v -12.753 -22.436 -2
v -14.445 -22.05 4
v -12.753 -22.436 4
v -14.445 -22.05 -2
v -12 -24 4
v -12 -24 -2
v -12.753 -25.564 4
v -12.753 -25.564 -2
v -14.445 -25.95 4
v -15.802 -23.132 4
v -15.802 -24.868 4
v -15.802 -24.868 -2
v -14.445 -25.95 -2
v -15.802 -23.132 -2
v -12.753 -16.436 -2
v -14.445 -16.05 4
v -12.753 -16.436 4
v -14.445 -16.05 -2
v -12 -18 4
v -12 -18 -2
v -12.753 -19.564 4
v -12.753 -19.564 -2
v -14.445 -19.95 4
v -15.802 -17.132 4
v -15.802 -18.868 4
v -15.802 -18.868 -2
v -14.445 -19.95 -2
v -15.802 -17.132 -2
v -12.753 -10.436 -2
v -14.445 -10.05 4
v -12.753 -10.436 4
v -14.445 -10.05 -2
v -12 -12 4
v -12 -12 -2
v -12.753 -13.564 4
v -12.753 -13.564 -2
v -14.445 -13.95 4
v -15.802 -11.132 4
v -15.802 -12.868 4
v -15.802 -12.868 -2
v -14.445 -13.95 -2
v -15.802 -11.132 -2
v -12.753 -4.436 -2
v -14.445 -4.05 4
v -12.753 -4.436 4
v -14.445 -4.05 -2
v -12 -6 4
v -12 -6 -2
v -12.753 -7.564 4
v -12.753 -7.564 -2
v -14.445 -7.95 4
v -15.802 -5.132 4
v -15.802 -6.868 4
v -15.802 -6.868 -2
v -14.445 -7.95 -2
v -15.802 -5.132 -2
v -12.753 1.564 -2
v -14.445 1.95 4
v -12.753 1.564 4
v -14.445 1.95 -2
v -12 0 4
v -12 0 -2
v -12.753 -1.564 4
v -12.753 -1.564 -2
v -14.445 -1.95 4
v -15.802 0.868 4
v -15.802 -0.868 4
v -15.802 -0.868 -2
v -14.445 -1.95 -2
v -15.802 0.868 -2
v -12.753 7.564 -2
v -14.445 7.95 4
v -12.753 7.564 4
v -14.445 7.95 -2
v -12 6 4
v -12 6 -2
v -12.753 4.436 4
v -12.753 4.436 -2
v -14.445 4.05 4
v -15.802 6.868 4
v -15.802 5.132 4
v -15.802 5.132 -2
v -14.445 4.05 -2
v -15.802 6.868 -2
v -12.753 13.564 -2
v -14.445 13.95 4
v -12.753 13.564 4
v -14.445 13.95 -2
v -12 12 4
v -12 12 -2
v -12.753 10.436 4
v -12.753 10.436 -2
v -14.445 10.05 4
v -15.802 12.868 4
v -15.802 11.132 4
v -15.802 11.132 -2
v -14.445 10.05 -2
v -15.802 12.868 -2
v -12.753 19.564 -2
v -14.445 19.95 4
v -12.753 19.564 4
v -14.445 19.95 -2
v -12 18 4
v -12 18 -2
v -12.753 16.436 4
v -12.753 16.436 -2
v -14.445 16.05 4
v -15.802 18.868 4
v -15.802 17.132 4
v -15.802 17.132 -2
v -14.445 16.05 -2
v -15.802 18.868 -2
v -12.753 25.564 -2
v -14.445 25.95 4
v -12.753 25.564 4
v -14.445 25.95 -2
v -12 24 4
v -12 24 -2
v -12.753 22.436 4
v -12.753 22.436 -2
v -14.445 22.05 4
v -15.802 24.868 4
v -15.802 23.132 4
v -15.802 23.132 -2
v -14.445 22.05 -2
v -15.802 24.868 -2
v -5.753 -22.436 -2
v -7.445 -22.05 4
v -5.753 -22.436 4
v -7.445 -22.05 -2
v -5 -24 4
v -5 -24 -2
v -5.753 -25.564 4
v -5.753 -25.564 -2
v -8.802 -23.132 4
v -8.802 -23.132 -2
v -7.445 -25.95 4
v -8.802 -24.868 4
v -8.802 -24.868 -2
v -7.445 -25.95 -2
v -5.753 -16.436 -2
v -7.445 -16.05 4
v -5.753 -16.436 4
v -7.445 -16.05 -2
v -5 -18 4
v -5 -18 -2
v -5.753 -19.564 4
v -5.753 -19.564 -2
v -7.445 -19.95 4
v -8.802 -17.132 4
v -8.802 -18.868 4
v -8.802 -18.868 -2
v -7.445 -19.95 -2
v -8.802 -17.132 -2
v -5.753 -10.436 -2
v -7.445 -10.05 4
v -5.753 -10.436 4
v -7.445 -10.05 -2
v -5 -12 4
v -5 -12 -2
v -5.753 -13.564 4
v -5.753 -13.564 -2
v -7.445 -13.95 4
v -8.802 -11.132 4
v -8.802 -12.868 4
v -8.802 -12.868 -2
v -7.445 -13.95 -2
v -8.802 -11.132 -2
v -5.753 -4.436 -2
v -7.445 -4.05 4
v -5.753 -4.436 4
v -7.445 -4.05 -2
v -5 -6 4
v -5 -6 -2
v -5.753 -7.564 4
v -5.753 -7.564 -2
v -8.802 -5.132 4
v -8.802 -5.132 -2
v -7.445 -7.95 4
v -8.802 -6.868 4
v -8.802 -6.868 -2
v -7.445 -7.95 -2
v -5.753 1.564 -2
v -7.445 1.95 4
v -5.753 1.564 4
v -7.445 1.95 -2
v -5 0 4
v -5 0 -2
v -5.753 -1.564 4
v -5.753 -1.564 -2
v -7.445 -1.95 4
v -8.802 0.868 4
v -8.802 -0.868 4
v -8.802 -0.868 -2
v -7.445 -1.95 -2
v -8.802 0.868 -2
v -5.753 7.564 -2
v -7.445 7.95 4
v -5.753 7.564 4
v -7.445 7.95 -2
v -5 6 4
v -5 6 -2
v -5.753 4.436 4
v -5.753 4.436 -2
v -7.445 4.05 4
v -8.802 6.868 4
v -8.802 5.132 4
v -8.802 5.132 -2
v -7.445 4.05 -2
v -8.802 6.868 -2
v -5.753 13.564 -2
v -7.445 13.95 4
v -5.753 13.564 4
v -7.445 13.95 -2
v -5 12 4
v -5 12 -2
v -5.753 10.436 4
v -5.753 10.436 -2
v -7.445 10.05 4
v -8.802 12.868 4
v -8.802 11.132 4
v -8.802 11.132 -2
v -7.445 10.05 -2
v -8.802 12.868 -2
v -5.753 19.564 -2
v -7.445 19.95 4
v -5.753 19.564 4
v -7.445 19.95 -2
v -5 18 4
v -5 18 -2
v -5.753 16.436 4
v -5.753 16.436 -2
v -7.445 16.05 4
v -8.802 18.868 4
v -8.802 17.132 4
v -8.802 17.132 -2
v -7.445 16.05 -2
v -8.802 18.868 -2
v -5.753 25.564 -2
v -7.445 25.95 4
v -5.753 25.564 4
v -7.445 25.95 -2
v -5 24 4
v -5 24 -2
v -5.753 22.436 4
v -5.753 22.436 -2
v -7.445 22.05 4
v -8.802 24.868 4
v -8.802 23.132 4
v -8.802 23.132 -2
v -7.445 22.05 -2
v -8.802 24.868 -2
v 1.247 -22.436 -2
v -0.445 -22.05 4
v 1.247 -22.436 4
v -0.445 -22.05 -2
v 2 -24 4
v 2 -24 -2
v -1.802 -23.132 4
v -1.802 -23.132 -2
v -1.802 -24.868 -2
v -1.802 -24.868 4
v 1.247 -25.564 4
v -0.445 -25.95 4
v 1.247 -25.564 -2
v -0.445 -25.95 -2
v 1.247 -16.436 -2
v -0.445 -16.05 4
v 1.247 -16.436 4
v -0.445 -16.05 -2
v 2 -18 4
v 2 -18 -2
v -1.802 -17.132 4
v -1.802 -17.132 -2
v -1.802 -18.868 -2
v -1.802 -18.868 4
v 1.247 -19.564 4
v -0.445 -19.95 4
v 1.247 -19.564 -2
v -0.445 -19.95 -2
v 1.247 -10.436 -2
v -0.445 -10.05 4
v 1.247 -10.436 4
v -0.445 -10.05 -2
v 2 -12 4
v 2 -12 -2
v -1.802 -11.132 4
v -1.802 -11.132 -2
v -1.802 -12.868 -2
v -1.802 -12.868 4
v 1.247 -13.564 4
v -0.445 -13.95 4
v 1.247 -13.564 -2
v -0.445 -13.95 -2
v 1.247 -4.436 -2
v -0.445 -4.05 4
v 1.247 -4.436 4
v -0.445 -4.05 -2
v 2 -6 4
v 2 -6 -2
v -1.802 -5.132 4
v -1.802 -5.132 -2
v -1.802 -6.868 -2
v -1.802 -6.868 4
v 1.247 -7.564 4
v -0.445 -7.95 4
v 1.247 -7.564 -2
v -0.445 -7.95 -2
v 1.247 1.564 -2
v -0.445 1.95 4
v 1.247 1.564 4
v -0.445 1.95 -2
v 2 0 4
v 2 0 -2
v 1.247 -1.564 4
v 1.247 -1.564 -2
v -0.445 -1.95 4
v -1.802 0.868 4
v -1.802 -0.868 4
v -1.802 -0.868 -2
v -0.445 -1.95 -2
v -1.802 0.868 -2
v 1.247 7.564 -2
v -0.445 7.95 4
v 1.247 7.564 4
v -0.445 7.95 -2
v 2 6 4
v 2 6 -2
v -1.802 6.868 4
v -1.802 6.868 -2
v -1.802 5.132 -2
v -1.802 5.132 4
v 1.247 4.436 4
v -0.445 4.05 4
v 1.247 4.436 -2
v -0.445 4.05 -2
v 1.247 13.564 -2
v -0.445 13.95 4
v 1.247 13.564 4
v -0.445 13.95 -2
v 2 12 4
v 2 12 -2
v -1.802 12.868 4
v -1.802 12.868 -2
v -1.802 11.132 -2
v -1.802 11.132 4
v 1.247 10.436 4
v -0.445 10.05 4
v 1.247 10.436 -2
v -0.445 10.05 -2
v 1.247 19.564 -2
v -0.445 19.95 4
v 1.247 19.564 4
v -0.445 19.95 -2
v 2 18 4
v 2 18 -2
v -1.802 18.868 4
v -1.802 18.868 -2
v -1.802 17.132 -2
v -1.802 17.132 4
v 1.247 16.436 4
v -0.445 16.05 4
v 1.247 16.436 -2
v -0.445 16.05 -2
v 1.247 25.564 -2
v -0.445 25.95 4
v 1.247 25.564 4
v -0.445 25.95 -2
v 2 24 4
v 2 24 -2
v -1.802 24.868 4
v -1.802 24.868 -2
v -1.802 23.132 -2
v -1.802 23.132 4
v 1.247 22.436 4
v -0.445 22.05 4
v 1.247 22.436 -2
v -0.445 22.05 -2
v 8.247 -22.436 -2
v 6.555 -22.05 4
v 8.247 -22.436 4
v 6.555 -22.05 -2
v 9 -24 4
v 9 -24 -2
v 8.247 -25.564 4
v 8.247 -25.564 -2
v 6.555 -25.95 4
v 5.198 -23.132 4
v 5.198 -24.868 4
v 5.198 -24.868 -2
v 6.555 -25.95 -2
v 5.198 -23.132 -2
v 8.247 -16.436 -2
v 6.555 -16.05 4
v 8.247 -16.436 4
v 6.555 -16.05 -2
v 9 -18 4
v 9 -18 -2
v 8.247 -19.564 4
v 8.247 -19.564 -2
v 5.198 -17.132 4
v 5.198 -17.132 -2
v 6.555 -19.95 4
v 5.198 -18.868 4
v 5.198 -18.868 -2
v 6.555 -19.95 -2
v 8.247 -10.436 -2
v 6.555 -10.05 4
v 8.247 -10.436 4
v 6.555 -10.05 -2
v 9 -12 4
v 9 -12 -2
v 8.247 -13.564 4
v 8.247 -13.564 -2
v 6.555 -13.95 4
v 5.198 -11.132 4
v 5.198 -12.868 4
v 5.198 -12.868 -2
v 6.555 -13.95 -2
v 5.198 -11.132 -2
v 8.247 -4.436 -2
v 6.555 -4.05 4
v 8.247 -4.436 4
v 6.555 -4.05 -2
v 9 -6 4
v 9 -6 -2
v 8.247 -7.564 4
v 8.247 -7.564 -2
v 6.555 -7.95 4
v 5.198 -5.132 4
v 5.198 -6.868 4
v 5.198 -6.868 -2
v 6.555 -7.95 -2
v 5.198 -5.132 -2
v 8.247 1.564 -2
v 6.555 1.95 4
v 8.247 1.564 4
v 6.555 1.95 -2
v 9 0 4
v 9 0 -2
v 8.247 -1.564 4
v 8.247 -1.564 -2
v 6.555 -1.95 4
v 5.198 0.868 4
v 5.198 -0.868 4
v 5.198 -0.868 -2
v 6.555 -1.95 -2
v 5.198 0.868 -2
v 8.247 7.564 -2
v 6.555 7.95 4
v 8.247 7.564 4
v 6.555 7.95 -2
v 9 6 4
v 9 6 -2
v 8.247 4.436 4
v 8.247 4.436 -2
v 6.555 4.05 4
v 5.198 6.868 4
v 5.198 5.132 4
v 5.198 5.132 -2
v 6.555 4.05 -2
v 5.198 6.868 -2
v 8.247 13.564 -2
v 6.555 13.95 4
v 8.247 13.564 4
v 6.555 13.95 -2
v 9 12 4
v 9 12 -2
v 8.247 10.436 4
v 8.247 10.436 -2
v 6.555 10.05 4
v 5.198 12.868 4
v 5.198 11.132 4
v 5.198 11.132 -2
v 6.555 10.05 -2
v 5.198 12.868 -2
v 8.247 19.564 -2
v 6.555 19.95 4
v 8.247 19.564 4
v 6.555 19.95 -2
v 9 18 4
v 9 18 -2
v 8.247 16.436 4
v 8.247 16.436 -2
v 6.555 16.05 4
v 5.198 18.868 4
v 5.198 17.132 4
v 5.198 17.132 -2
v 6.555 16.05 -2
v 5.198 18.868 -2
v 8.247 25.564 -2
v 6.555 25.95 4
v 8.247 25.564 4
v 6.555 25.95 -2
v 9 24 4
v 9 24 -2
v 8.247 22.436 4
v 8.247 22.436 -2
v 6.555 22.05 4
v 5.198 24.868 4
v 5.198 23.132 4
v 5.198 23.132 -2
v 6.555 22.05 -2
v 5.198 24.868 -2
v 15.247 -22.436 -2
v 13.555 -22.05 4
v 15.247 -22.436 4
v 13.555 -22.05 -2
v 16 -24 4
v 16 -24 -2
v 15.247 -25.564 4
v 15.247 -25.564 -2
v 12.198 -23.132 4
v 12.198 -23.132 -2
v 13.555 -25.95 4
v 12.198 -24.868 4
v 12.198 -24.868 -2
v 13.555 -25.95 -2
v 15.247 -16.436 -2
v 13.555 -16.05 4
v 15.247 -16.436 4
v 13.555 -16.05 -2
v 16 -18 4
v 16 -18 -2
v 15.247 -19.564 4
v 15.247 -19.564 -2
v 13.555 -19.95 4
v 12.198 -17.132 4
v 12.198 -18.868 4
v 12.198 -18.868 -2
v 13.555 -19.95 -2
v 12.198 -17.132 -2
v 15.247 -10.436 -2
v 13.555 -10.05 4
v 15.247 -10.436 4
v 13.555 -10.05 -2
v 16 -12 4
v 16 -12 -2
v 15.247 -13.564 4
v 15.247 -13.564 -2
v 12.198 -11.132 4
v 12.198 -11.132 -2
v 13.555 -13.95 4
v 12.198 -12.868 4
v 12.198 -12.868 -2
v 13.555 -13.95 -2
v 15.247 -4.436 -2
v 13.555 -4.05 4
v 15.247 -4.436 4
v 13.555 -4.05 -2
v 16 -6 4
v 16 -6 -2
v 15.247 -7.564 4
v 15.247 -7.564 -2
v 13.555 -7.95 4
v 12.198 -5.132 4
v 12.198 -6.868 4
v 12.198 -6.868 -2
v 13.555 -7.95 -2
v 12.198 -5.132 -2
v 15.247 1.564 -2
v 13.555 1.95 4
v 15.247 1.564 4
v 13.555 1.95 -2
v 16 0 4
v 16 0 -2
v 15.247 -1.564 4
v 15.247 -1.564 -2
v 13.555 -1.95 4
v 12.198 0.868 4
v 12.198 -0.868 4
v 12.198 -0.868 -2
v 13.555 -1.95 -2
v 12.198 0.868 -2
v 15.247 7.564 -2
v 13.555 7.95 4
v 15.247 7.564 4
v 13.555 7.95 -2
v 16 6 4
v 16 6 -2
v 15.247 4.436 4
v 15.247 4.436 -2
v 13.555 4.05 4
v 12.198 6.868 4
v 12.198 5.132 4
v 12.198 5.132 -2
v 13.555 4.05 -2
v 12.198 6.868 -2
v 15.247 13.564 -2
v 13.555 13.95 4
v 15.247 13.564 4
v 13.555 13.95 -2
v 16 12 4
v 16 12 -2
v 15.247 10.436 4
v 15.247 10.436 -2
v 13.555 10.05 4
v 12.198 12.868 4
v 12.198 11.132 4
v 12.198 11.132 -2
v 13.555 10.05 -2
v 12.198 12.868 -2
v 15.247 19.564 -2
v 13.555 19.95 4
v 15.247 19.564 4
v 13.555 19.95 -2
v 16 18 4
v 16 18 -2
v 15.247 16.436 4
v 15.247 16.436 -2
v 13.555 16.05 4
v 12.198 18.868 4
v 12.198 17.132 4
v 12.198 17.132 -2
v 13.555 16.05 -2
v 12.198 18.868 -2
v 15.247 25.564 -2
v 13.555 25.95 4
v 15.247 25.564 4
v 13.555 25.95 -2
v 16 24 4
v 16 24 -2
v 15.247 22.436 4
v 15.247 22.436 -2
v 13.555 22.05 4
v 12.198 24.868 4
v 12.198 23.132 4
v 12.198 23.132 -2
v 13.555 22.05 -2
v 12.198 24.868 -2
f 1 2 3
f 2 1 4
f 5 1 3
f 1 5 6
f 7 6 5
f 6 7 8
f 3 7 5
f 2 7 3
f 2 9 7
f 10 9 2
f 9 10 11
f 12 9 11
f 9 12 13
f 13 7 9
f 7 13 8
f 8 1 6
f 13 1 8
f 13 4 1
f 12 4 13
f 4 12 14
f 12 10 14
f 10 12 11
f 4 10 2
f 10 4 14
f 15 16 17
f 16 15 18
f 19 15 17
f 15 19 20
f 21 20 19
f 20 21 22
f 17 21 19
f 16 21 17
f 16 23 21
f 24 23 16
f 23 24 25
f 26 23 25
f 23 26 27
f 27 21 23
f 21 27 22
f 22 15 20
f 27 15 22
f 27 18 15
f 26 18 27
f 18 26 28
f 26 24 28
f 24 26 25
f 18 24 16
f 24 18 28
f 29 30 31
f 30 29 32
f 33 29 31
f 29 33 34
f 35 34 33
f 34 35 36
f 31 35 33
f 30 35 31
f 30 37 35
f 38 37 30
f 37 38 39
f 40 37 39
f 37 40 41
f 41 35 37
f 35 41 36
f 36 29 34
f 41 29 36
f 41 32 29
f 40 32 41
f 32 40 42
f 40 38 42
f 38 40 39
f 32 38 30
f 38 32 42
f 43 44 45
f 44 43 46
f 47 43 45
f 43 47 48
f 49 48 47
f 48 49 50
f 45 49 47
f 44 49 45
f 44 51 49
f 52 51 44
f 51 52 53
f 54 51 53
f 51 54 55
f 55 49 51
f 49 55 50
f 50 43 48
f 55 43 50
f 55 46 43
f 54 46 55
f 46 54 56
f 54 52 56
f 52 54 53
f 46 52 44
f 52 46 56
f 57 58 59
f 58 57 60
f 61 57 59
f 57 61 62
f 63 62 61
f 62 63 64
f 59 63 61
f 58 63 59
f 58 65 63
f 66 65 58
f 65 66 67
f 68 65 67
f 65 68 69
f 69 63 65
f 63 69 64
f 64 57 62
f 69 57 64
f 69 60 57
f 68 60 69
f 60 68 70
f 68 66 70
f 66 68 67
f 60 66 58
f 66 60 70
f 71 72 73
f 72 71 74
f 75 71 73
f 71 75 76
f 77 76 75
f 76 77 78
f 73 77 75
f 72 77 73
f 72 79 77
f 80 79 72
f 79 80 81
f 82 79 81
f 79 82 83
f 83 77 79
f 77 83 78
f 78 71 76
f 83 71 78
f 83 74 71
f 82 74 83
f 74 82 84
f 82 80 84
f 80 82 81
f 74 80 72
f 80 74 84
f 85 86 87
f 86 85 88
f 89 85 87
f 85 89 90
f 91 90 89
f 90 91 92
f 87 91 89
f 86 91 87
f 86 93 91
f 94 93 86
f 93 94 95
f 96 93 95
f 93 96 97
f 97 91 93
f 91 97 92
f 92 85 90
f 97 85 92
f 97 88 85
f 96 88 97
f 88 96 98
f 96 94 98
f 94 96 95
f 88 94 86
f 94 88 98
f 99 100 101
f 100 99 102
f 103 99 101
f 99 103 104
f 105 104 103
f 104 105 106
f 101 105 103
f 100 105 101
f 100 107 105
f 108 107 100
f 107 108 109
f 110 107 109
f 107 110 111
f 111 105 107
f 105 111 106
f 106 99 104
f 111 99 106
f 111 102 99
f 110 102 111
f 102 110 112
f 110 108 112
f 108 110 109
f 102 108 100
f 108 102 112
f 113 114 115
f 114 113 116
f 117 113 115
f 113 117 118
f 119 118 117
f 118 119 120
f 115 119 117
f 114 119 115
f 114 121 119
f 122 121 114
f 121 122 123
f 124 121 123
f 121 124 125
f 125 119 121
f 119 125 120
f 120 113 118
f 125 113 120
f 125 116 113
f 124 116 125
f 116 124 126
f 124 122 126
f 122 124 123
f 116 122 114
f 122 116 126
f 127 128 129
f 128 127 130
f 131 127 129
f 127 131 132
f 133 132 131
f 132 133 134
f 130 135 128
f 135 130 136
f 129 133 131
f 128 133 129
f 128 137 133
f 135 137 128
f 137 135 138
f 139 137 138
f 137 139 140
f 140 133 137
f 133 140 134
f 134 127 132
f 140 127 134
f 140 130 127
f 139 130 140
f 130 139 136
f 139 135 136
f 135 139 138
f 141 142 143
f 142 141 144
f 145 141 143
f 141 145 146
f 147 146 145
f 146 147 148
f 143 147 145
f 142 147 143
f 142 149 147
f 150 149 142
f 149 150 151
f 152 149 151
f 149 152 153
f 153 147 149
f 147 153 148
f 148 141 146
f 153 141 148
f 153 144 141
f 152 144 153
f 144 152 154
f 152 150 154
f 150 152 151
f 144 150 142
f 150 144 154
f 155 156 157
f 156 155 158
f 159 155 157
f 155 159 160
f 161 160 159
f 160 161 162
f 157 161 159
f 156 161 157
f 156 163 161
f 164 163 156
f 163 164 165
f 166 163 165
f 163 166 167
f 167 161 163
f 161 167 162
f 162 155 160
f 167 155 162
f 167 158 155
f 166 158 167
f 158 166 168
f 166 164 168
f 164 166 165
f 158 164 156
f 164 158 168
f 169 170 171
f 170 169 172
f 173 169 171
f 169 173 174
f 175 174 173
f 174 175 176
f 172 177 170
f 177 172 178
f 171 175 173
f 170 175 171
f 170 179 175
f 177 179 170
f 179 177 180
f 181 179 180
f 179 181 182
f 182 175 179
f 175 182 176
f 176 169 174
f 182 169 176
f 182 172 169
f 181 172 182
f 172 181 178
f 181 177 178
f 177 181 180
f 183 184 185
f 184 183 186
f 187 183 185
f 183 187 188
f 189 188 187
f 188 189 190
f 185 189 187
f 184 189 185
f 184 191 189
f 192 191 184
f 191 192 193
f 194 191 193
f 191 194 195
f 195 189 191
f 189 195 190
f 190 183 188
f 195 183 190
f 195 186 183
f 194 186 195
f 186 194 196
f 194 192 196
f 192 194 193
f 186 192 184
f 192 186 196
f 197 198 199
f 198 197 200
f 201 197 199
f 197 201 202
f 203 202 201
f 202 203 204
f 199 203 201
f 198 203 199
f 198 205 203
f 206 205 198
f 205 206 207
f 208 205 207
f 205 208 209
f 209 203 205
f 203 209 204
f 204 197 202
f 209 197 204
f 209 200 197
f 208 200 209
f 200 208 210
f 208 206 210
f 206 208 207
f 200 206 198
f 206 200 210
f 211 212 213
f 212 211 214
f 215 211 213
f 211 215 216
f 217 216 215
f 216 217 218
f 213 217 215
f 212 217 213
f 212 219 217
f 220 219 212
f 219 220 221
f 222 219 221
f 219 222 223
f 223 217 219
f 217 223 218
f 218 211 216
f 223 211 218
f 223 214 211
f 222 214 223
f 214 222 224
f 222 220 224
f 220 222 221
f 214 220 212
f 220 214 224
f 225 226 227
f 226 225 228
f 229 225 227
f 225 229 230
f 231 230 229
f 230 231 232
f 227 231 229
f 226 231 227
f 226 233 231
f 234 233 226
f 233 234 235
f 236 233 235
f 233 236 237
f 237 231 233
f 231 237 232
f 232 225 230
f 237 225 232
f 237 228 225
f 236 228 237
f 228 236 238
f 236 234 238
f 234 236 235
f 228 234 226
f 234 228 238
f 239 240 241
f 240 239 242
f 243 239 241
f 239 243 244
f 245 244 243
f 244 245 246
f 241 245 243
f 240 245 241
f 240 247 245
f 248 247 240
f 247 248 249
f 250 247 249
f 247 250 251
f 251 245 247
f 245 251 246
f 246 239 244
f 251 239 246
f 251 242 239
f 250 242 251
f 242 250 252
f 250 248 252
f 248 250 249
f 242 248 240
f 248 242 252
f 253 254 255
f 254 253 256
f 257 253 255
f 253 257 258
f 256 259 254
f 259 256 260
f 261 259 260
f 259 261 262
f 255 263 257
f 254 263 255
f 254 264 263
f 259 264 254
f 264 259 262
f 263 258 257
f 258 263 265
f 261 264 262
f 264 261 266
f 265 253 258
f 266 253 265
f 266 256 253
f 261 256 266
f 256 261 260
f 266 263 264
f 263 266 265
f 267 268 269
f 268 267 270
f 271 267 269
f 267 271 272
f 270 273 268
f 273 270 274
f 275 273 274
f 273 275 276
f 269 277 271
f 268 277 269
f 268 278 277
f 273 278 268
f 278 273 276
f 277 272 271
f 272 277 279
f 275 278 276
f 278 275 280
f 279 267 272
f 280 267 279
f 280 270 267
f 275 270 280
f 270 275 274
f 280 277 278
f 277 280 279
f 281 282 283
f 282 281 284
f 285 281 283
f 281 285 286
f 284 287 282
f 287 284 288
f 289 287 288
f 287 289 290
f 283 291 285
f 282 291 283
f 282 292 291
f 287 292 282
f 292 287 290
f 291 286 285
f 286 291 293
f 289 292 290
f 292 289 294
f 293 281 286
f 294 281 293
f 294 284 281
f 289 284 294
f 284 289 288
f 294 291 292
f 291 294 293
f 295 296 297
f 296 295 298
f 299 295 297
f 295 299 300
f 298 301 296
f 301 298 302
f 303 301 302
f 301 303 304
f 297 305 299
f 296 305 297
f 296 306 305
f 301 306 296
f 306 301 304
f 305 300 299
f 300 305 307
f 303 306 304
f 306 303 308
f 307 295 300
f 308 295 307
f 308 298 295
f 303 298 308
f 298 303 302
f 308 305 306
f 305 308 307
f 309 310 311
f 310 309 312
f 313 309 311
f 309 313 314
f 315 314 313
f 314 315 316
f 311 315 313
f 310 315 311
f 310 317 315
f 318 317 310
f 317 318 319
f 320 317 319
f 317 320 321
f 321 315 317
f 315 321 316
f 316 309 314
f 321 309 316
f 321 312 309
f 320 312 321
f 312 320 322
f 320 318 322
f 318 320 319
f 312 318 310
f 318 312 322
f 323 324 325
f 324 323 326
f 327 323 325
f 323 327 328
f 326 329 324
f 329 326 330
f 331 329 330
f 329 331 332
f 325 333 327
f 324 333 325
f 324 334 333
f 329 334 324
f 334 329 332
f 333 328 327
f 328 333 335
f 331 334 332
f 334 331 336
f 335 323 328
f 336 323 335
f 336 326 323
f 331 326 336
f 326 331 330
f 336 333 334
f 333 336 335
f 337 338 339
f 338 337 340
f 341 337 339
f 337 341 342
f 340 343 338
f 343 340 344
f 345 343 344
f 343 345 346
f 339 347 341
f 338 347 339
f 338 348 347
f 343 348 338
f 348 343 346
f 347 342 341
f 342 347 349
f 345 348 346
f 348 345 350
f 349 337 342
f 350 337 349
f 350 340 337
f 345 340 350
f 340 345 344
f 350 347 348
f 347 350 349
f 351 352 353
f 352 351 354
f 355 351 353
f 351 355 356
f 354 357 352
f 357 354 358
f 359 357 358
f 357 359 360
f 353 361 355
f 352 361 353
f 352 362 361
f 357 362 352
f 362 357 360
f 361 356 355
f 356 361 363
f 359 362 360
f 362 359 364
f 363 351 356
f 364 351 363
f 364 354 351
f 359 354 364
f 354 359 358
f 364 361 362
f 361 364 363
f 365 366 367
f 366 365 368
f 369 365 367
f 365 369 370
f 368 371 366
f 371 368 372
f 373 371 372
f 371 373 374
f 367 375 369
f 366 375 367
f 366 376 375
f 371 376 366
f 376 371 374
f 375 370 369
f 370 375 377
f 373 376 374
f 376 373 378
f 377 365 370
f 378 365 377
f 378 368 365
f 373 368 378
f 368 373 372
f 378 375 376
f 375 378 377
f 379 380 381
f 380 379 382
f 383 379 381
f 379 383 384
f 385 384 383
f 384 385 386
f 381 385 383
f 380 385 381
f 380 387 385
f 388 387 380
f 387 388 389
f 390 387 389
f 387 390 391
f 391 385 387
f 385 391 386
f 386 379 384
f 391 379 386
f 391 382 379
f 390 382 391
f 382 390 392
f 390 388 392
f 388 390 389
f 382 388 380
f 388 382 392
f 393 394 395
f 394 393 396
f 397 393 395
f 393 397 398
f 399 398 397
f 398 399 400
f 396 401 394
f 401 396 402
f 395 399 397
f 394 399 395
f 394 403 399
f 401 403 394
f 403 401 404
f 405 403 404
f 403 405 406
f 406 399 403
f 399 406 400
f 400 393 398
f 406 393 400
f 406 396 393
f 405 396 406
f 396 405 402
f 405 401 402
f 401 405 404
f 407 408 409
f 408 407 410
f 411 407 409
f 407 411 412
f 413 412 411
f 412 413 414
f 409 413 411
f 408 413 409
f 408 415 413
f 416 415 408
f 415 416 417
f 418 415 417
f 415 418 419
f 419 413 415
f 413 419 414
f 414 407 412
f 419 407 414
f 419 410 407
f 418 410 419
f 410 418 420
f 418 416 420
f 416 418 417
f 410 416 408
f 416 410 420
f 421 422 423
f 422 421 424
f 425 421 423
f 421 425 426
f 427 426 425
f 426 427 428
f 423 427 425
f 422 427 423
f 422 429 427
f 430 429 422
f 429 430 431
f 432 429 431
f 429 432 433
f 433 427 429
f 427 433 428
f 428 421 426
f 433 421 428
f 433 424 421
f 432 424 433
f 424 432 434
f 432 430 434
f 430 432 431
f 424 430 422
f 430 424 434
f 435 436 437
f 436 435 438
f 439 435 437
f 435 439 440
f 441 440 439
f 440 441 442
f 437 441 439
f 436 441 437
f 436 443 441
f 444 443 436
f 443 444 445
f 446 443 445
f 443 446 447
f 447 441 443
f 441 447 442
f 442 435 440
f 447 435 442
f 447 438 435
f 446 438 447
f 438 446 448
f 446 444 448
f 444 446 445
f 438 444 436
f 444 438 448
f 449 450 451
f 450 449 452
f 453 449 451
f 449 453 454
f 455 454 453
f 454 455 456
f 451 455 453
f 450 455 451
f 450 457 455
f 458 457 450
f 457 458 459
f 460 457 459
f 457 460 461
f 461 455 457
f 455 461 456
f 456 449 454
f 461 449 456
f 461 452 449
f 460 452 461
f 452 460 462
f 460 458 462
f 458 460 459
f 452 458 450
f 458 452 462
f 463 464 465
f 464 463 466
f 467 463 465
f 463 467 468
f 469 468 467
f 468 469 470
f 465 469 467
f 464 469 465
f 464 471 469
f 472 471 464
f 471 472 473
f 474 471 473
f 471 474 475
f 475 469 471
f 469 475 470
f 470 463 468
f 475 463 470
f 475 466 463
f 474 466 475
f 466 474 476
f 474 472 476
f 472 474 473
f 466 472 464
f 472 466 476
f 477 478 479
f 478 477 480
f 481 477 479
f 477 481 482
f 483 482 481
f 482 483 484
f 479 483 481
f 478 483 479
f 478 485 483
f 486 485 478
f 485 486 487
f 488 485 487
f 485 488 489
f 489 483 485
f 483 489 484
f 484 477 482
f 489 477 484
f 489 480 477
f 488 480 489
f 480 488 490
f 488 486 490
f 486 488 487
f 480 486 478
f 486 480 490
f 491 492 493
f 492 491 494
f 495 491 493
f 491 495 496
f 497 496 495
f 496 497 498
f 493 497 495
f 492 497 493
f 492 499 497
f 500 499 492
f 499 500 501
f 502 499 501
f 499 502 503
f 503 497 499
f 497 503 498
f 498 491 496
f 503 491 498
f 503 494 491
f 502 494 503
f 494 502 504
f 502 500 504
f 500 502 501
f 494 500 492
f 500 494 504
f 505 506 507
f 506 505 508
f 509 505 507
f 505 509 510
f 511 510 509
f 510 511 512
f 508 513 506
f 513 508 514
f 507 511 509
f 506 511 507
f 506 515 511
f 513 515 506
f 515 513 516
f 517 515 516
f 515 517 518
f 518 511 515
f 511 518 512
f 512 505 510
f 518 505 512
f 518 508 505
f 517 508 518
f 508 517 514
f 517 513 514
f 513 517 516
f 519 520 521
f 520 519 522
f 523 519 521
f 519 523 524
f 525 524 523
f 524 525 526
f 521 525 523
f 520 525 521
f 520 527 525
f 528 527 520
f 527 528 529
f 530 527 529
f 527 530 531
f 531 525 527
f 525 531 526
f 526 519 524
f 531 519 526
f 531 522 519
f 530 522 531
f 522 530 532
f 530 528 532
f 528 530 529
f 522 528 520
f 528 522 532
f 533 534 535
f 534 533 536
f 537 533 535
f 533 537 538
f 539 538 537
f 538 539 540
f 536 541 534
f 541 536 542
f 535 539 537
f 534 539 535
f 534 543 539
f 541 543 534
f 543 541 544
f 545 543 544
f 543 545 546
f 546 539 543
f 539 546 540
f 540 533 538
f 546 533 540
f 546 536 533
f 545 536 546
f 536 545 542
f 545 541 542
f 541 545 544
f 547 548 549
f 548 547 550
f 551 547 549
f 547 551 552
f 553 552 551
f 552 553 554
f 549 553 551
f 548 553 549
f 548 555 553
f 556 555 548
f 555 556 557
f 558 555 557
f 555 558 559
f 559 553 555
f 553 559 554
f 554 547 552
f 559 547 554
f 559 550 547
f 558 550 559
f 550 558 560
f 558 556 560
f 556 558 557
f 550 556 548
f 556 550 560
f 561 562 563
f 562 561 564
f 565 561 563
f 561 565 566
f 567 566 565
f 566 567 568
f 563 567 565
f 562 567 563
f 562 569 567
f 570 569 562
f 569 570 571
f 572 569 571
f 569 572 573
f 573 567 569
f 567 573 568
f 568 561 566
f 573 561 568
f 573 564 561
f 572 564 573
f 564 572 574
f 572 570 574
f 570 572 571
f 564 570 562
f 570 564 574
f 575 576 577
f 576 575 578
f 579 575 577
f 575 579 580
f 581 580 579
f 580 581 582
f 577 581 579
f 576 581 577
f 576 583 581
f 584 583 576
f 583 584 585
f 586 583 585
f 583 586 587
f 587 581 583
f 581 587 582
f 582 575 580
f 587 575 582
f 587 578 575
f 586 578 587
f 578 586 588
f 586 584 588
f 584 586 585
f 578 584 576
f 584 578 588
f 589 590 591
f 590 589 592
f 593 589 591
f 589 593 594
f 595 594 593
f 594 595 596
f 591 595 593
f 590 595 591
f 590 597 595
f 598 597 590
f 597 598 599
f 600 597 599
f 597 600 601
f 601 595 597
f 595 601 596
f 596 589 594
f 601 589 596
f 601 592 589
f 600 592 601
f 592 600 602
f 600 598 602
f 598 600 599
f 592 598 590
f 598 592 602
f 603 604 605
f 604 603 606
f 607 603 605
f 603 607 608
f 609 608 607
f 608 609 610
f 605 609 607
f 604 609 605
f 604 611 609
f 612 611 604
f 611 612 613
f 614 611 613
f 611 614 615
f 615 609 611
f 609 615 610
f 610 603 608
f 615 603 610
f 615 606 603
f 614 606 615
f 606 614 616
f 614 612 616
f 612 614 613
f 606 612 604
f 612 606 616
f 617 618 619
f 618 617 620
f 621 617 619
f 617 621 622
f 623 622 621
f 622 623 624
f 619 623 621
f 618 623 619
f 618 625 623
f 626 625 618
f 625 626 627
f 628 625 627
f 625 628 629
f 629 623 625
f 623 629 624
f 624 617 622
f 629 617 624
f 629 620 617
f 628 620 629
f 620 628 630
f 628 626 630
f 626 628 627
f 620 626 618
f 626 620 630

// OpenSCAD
/* This customizable algorithm will fill an area with
   a number of cylinders of a desired height. This is
   handy for subtracting from a solid, thus creating
   vent holes. The spacing in x and y direction is not
   necessarily equal as the algorithm will fill with
   cylinders right to the very edges. A space of one cylinder
   diameter is maintained around the edges of the area.
   For instance if you make a lid say 40 x 60, then if diameter is 4,
   an area of 32 x 52 is exactly filled. 40 - 2*4, 60 - 2*4.
*/

//---------------------------------------------------------------------
// User inputs

   lengthx=40;    //x direction of area
   lengthy=60;    //y direction of area
   cyldiam=4;     //diameter of the cylinders
   height=6;      //height of the cylinders
   spacingx=6.0;  //desired spacing x direction
   spacingy=6.0;  //desired spacing y direction

// End of user input
//---------------------------------------------------------------------


//program start, change anything below this at your own peril!

r=cyldiam / 2;         //radius equals half diameter
a=lengthx - 3*cyldiam; //calculate the space around perimeter
b=lengthy - 3*cyldiam; //calculate the space around perimeter
// used 3 diameters because of the cylinder at the center
sx=spacingx;
sy=spacingy;

module array() {

  qa = floor(a/2/sx);  //number of x direction rows + and -
  echo("qa=",qa);
  qb = floor(b/2/sy);  //number of y direction rows + and -
  echo("qb=",qb);
  //now adjust spacing so space is exactly filled
  sx = (a/2/qa);
  echo("sx=", sx);
  sy = (b/2/qb);
  echo("sy=", sy);
  //build the array
    for (x=[-qa:qa])
      for (y=[-qb:qb])
        translate([x*sx,y*sy,r/2])
          cylinder(h=height, r=r, ,center=true);
} // end of module array()


array();
